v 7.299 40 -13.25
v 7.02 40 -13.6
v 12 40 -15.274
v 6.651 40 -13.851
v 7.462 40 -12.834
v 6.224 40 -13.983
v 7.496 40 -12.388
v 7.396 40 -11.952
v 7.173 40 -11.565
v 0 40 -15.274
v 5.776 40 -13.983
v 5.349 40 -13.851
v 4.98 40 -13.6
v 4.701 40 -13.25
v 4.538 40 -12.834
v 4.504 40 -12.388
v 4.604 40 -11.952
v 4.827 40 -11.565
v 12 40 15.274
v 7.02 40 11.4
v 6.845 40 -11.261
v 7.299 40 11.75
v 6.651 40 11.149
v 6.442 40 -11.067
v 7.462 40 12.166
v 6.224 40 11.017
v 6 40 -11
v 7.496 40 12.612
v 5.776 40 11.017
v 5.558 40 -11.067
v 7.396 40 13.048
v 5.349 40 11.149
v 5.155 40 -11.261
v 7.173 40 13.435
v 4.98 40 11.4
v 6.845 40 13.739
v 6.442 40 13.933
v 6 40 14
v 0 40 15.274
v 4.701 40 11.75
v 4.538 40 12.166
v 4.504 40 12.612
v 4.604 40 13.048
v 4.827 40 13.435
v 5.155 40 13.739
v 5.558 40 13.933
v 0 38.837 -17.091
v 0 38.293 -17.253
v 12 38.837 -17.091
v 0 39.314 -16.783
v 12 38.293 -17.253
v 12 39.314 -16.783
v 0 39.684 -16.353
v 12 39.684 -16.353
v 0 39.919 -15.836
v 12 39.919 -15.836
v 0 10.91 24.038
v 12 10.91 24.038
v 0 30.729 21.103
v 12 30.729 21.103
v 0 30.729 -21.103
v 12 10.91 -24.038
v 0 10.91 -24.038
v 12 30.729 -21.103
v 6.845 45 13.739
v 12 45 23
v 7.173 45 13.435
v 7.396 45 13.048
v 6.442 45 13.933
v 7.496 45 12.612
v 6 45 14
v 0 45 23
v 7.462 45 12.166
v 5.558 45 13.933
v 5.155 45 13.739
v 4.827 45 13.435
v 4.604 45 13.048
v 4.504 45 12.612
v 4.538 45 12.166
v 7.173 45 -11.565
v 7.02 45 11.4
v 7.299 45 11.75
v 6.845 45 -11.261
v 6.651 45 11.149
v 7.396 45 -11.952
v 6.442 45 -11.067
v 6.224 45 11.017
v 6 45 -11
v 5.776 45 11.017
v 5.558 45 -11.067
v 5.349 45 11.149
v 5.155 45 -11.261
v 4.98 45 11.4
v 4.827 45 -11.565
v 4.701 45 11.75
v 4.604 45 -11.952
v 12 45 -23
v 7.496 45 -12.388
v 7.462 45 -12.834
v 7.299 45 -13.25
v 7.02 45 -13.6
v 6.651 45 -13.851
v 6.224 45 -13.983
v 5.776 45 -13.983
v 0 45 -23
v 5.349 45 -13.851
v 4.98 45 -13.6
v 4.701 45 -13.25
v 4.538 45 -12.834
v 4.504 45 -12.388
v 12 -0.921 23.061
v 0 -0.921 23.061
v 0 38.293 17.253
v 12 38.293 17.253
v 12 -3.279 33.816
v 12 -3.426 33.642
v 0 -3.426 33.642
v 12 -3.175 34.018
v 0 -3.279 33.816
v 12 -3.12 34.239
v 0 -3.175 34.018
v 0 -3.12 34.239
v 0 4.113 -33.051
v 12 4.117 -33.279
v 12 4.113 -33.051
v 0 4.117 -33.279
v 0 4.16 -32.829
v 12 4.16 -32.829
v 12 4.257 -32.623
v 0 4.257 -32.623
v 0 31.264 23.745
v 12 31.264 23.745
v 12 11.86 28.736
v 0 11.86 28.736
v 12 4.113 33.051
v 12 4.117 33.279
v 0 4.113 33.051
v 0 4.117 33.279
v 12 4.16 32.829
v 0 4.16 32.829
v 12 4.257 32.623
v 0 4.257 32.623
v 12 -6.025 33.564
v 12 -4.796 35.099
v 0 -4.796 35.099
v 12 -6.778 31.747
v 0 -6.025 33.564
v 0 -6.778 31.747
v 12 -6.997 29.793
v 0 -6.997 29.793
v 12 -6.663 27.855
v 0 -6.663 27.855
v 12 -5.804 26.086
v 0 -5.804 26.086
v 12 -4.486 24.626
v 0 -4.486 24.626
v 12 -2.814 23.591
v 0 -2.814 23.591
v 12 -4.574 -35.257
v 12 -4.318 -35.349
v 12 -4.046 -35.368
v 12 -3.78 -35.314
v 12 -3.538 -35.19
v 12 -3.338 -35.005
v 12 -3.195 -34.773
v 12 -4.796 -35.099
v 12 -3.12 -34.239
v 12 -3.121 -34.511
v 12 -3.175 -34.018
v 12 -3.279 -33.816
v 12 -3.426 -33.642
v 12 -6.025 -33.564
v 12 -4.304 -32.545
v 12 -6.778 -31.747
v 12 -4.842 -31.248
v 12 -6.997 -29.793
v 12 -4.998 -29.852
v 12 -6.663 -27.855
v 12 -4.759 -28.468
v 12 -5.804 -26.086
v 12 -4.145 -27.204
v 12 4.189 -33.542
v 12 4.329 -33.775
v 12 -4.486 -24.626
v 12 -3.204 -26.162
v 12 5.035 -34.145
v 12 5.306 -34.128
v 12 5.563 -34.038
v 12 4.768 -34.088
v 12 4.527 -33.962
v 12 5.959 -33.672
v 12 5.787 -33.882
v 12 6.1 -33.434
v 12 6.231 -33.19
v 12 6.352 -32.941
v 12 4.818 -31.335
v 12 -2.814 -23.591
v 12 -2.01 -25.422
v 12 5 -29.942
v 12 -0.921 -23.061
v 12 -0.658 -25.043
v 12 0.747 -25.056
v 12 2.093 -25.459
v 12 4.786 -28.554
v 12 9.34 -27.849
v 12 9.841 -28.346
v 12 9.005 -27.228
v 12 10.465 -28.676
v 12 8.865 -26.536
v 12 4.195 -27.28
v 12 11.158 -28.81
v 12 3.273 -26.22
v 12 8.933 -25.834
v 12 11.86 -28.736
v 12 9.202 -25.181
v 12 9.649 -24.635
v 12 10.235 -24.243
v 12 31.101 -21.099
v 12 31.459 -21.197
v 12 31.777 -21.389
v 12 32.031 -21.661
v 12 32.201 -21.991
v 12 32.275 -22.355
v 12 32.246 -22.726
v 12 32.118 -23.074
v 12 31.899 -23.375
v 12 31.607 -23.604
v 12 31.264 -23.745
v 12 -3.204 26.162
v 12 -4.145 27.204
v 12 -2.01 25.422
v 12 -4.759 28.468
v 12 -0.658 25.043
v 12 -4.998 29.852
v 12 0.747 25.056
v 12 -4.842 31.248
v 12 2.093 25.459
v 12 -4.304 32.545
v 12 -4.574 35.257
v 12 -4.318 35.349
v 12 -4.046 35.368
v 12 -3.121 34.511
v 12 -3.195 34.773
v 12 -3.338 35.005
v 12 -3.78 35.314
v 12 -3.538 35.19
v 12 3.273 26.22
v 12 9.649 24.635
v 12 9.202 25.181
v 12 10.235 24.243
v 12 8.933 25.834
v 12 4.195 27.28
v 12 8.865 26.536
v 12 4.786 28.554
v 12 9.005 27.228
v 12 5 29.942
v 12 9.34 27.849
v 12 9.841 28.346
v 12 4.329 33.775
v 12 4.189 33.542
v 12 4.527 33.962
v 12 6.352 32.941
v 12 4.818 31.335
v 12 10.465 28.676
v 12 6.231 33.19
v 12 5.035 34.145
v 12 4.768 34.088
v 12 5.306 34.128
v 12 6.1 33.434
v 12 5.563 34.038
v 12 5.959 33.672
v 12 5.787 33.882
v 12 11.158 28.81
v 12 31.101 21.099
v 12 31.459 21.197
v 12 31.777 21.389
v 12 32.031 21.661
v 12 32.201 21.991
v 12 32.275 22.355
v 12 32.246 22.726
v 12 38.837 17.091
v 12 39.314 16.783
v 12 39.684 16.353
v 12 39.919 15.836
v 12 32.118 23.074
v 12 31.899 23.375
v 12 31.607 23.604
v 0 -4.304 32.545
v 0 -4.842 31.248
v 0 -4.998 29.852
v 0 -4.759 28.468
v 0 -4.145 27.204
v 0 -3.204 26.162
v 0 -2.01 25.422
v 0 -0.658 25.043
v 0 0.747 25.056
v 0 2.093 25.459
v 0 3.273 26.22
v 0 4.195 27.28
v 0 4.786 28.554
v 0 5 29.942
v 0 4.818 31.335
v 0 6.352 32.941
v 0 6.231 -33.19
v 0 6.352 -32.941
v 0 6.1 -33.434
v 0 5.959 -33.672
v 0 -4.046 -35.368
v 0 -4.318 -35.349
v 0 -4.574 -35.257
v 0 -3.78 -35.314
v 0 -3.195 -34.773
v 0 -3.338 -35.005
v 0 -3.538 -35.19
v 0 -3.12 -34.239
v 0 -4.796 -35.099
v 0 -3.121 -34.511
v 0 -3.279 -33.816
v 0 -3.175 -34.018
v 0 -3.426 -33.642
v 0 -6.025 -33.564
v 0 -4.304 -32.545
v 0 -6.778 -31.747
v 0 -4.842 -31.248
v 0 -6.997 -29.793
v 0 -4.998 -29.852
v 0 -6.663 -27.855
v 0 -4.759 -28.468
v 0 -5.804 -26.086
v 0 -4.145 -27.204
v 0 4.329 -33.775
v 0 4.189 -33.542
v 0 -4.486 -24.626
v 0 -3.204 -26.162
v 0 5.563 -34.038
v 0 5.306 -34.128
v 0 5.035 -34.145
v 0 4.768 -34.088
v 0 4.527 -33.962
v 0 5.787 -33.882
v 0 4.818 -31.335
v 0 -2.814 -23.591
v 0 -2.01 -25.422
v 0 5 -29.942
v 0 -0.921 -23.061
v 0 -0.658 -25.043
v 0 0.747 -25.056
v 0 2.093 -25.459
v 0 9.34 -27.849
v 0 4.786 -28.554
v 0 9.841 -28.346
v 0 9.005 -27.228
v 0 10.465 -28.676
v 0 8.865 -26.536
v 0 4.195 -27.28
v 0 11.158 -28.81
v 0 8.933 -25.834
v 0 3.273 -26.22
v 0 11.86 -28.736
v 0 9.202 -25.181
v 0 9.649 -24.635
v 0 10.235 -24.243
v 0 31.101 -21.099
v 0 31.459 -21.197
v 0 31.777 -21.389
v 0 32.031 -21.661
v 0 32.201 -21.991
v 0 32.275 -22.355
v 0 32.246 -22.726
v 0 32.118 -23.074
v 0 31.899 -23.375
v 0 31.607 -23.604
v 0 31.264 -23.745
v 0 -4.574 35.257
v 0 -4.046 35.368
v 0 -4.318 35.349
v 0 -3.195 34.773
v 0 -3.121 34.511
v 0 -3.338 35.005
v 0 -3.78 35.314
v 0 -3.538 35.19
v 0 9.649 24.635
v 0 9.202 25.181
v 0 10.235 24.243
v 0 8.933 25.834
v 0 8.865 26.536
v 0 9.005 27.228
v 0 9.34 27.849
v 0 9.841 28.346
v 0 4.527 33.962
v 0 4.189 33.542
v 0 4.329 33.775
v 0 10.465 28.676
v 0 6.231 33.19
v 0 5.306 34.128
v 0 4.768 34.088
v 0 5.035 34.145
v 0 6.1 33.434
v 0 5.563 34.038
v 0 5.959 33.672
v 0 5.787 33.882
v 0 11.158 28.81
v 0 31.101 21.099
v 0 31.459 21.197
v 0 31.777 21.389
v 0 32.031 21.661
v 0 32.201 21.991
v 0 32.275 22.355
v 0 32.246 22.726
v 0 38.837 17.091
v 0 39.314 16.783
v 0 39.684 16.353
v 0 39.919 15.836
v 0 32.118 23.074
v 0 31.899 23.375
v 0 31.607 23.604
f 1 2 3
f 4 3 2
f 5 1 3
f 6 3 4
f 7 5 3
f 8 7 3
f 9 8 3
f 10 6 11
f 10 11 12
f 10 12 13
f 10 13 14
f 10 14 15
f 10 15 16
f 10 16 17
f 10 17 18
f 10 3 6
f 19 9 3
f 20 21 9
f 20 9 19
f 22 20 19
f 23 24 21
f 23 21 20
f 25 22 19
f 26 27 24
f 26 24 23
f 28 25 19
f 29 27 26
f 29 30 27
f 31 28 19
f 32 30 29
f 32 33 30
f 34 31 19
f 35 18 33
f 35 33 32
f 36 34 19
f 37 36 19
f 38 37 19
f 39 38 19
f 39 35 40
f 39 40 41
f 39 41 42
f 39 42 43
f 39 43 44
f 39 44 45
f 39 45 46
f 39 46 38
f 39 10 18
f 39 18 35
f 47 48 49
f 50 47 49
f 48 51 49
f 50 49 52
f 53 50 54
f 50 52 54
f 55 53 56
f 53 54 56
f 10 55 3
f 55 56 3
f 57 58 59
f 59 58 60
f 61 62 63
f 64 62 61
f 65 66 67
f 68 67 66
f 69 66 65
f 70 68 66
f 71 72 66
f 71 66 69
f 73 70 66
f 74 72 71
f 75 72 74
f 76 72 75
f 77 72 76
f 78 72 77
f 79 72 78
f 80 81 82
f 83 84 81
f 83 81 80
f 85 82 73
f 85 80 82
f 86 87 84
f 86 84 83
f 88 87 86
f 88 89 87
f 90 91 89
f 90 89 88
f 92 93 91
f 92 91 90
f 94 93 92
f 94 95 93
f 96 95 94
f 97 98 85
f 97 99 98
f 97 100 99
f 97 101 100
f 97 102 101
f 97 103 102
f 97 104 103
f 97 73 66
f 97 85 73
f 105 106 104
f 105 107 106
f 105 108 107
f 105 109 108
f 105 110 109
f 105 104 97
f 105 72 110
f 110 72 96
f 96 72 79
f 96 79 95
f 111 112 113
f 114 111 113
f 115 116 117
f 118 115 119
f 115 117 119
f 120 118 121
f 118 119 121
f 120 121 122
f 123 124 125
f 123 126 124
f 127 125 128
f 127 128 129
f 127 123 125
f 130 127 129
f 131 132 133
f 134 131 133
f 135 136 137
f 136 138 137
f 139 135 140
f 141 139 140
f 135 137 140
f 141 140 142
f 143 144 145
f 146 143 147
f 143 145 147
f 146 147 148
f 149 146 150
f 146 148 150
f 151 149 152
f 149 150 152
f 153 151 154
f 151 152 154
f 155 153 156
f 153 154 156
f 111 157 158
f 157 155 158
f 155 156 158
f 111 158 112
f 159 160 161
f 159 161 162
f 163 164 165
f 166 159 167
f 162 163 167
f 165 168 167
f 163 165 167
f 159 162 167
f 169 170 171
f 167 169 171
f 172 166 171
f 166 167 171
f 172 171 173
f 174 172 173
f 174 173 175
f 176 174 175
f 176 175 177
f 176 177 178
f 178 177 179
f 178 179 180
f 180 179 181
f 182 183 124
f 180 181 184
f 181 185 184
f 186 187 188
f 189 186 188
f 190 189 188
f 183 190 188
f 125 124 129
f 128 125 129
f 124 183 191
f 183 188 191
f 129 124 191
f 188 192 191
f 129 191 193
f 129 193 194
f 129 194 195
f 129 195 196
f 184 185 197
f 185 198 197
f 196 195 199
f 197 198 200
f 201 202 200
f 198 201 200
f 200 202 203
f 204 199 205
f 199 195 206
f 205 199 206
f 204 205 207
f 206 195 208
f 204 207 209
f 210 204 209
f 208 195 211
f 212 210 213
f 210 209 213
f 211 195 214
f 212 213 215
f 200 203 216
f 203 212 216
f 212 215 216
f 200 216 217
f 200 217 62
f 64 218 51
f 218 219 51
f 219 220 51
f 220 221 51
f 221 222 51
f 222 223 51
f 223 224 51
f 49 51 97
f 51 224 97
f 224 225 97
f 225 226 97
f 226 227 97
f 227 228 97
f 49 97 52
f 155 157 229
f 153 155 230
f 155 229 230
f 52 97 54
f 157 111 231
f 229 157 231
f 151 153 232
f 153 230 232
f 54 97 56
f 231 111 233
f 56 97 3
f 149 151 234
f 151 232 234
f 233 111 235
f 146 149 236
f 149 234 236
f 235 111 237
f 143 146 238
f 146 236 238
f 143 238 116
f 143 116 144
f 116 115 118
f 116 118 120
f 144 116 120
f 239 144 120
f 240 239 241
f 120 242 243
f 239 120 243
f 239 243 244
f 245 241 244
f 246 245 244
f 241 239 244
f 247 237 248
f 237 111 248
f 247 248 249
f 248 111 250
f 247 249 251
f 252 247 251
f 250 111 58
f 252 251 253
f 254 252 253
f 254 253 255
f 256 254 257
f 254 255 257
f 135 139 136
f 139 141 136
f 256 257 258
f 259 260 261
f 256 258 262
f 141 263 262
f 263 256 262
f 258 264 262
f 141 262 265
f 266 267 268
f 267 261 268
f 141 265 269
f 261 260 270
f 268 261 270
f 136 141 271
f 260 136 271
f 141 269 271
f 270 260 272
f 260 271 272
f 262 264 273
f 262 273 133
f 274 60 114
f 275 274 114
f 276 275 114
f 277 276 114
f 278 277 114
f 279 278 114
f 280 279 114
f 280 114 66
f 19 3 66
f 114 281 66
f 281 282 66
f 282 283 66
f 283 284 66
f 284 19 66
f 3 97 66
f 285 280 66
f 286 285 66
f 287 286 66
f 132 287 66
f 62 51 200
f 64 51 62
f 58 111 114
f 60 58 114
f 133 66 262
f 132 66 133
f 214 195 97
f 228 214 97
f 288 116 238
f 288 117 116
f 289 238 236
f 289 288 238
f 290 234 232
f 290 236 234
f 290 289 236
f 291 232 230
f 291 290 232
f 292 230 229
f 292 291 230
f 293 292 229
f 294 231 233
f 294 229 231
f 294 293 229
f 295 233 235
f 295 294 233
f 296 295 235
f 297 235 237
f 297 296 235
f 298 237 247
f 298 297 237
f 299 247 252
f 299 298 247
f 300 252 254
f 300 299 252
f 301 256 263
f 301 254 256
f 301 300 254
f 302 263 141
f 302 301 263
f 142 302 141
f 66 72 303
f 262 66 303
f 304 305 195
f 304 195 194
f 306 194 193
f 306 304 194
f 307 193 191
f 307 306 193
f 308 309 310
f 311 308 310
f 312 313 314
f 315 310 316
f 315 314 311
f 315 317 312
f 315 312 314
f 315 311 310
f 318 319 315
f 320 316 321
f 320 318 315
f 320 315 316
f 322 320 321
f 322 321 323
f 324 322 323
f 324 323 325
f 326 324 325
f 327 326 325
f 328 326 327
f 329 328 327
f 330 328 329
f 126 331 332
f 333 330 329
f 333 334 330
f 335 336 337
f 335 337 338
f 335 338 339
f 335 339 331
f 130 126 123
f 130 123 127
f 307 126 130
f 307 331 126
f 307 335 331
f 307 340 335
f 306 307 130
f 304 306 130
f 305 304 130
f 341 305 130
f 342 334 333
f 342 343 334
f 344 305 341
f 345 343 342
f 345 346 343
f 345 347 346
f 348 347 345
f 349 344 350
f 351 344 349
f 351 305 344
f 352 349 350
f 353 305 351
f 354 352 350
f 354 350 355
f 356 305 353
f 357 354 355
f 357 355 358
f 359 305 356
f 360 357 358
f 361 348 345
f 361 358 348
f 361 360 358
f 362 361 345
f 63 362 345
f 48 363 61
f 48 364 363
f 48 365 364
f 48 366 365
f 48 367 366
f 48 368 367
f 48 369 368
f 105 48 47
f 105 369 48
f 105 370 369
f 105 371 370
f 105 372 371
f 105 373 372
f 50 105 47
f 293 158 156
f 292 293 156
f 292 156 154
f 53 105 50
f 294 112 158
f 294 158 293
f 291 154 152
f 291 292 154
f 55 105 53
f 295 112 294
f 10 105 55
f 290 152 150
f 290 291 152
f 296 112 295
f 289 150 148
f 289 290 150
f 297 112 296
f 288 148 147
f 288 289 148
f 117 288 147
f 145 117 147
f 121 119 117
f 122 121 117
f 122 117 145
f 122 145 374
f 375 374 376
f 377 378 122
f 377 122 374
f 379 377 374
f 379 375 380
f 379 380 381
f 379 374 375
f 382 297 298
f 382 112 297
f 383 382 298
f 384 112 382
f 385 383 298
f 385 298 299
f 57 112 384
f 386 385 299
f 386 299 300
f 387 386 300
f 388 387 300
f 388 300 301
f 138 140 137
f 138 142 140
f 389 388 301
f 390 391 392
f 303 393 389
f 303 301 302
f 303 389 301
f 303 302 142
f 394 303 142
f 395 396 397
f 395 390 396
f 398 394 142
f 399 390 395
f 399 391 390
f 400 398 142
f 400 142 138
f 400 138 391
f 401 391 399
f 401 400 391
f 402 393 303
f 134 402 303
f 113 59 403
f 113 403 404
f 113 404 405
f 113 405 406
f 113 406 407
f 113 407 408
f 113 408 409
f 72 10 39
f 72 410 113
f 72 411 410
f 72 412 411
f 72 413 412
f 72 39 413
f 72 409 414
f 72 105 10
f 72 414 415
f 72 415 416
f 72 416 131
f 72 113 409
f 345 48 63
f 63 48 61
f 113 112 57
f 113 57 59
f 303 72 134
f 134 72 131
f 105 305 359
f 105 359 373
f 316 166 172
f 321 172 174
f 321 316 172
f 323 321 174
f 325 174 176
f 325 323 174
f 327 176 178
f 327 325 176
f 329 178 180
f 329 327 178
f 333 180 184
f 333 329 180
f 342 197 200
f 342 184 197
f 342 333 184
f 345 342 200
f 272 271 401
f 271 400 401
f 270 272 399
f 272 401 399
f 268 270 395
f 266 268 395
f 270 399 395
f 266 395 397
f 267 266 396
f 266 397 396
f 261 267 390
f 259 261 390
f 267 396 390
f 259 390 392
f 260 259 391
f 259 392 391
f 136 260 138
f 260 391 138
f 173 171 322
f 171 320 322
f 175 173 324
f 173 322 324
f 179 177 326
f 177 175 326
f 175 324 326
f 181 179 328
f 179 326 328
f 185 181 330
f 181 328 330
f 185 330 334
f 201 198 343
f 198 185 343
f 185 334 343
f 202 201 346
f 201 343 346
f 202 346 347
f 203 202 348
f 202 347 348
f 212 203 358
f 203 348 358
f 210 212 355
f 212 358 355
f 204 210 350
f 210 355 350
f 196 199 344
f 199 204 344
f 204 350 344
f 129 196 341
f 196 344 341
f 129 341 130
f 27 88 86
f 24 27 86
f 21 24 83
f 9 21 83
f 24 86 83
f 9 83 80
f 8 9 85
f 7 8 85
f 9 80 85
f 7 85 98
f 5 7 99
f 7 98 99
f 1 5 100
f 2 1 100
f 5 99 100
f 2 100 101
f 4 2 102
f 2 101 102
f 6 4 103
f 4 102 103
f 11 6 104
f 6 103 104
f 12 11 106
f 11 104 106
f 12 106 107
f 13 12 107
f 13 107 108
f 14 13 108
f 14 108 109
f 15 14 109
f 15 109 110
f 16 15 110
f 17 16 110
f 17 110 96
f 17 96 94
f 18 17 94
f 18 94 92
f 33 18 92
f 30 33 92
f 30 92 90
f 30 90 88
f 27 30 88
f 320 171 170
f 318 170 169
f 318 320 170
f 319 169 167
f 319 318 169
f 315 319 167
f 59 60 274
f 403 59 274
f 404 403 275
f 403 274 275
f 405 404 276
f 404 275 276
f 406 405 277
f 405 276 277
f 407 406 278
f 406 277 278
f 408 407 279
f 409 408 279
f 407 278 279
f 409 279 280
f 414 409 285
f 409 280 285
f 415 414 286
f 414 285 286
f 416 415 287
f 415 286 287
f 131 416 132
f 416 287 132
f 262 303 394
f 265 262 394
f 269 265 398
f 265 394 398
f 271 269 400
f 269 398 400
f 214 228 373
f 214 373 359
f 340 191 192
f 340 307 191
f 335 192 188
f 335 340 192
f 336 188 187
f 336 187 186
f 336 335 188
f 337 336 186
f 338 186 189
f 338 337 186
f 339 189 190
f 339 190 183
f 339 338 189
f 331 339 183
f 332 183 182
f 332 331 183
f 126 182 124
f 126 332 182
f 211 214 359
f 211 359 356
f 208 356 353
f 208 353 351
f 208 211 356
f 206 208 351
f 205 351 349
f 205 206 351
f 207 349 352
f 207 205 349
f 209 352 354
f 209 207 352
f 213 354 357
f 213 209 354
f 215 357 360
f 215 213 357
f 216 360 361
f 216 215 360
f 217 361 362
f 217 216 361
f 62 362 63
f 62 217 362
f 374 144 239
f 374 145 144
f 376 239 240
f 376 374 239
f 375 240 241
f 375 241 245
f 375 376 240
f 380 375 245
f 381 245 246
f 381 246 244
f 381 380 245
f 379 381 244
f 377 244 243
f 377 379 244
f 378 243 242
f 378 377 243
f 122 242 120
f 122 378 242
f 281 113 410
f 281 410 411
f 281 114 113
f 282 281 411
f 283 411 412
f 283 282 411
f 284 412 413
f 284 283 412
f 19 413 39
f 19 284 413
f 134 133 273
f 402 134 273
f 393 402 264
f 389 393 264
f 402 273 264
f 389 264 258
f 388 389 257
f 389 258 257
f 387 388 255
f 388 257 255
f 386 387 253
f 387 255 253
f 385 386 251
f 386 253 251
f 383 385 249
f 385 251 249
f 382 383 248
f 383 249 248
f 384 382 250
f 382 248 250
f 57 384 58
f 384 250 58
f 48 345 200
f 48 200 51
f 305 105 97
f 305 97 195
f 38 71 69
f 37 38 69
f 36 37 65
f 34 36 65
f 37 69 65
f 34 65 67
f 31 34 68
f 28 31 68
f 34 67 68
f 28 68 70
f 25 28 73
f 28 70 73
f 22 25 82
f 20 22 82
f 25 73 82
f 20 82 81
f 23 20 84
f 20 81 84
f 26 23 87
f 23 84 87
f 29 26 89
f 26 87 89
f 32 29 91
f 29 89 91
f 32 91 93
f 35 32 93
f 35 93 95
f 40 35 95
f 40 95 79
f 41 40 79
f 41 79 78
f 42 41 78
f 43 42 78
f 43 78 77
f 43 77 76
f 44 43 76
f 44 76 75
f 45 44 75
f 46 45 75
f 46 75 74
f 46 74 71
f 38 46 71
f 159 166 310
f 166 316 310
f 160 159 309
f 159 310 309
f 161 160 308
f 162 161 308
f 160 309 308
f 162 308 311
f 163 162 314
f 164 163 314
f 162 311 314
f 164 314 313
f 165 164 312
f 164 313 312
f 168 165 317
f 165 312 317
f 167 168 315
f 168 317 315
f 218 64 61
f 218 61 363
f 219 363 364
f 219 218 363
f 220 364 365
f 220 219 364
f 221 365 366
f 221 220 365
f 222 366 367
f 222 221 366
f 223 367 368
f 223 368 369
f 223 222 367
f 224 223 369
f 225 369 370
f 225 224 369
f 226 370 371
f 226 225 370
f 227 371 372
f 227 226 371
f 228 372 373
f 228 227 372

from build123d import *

# Parameters (mm, degrees)
SKETCH1_R           = 7
SKETCH1_R_2         = 5
BOSS_EXTRUDE1_DEPTH = 12
CUT_EXTRUDE1_DEPTH  = 40.522145691
FILLET1_R           = 1
BOSS_EXTRUDE2_START = -12
BOSS_EXTRUDE2_DEPTH = 12
FILLET2_R           = 2
CUT_EXTRUDE2_DEPTH  = 59.481408086
SKETCH7_R           = 1.5
CUT_EXTRUDE3_DEPTH  = 65.024019647


with BuildPart() as part:
    # Sketch1 → Boss-Extrude1 (new body)
    with BuildSketch(Plane(origin=(0, 0, 0), x_dir=(0, 0, -1), z_dir=(1, 0, 0))):
        with Locations((-30, 0)):
            Circle(SKETCH1_R)
        with Locations((-30, 0)):
            Circle(SKETCH1_R_2, mode=Mode.SUBTRACT)
    extrude(amount=BOSS_EXTRUDE1_DEPTH)

    # Sketch3 → Cut-Extrude1 (cut, through all)
    with BuildSketch(Plane(origin=(12, 0, 0), x_dir=(0, 0, -1), z_dir=(1, 0, 0))):
        Polygon((-26.132418273, 3.168881756), (-27.092472621, -4.067712446), (-40.54775296, -2.282646151), (-39.587698612, 4.953948051), align=None)
    extrude(amount=-CUT_EXTRUDE1_DEPTH, mode=Mode.SUBTRACT)

    # Fillet1
    fillet1_edges = [part.edges().sort_by_distance(p)[0] for p in [
        (6, 4.067712446, 32.907527379),
        (6, 4.403840469, 35.441156966),
        (6, -3.168881756, 33.867581727),
        (6, -2.832753733, 36.401211314),
    ]]
    fillet(fillet1_edges, radius=FILLET1_R - 0.0001)  # a hair under: the kernel refuses the full size

    # Sketch4 → Boss-Extrude2 (add)
    with BuildSketch(Plane(origin=(12, 0, 0), x_dir=(0, 0, -1), z_dir=(1, 0, 0)).offset(BOSS_EXTRUDE2_START)):
        with BuildLine():
            Line((-23.06080008, -0.92060006), (-17, 40))
            Line((-17, 40), (0, 40))
            Line((0, 40), (0, 45))
            Line((0, 45), (-23, 45))
            Line((-23, 45), (-32.940967226, 6.352221011))
            ThreePointArc((-32.940967226, 6.352221011), (-25.850307511, 5.63737991), (-23.06080008, -0.92060006))
        make_face()
    extrude(amount=BOSS_EXTRUDE2_DEPTH)

    # Fillet2
    fillet2_edges = [part.edges().sort_by_distance(p)[0] for p in [
        (6, 40, 17),
    ]]
    fillet(fillet2_edges, radius=FILLET2_R)

    # Sketch6 → Cut-Extrude2 (cut, through all)
    with BuildSketch(Plane(origin=(12, 0, 0), x_dir=(0, 0, -1), z_dir=(1, 0, 0))):
        with BuildLine():
            Line((-24.037943225, 10.910448491), (-21.102528553, 30.729437441))
            ThreePointArc((-21.102528553, 30.729437441), (-22.170547869, 32.250479964), (-23.74540162, 31.263529469))
            Line((-23.74540162, 31.263529469), (-28.73638424, 11.859945407))
            ThreePointArc((-28.73638424, 11.859945407), (-26.887444194, 8.909635204), (-24.037943225, 10.910448491))
        make_face()
    extrude(amount=-CUT_EXTRUDE2_DEPTH, mode=Mode.SUBTRACT)

    # Mirror9: part across plane


with BuildPart() as part_1:
    add(part.part)
    add(part.part.mirror(Plane(origin=(-56.513793287, 40, 0), x_dir=(1, 0, 0), z_dir=(0, 0, -1))))

    # Sketch7 → Cut-Extrude3 (cut, through all)
    with BuildSketch(Plane(origin=(0, 45, 0), x_dir=(1, 0, 0), z_dir=(0, 1, 0))):
        with Locations(Location((6, -12.5, 0), (0, 0, 270))):
            Circle(SKETCH7_R)
        with Locations(Location((6, 12.5, 0), (0, 0, 270))):
            Circle(SKETCH7_R)
    extrude(amount=-CUT_EXTRUDE3_DEPTH, mode=Mode.SUBTRACT)


solid = part_1.part
